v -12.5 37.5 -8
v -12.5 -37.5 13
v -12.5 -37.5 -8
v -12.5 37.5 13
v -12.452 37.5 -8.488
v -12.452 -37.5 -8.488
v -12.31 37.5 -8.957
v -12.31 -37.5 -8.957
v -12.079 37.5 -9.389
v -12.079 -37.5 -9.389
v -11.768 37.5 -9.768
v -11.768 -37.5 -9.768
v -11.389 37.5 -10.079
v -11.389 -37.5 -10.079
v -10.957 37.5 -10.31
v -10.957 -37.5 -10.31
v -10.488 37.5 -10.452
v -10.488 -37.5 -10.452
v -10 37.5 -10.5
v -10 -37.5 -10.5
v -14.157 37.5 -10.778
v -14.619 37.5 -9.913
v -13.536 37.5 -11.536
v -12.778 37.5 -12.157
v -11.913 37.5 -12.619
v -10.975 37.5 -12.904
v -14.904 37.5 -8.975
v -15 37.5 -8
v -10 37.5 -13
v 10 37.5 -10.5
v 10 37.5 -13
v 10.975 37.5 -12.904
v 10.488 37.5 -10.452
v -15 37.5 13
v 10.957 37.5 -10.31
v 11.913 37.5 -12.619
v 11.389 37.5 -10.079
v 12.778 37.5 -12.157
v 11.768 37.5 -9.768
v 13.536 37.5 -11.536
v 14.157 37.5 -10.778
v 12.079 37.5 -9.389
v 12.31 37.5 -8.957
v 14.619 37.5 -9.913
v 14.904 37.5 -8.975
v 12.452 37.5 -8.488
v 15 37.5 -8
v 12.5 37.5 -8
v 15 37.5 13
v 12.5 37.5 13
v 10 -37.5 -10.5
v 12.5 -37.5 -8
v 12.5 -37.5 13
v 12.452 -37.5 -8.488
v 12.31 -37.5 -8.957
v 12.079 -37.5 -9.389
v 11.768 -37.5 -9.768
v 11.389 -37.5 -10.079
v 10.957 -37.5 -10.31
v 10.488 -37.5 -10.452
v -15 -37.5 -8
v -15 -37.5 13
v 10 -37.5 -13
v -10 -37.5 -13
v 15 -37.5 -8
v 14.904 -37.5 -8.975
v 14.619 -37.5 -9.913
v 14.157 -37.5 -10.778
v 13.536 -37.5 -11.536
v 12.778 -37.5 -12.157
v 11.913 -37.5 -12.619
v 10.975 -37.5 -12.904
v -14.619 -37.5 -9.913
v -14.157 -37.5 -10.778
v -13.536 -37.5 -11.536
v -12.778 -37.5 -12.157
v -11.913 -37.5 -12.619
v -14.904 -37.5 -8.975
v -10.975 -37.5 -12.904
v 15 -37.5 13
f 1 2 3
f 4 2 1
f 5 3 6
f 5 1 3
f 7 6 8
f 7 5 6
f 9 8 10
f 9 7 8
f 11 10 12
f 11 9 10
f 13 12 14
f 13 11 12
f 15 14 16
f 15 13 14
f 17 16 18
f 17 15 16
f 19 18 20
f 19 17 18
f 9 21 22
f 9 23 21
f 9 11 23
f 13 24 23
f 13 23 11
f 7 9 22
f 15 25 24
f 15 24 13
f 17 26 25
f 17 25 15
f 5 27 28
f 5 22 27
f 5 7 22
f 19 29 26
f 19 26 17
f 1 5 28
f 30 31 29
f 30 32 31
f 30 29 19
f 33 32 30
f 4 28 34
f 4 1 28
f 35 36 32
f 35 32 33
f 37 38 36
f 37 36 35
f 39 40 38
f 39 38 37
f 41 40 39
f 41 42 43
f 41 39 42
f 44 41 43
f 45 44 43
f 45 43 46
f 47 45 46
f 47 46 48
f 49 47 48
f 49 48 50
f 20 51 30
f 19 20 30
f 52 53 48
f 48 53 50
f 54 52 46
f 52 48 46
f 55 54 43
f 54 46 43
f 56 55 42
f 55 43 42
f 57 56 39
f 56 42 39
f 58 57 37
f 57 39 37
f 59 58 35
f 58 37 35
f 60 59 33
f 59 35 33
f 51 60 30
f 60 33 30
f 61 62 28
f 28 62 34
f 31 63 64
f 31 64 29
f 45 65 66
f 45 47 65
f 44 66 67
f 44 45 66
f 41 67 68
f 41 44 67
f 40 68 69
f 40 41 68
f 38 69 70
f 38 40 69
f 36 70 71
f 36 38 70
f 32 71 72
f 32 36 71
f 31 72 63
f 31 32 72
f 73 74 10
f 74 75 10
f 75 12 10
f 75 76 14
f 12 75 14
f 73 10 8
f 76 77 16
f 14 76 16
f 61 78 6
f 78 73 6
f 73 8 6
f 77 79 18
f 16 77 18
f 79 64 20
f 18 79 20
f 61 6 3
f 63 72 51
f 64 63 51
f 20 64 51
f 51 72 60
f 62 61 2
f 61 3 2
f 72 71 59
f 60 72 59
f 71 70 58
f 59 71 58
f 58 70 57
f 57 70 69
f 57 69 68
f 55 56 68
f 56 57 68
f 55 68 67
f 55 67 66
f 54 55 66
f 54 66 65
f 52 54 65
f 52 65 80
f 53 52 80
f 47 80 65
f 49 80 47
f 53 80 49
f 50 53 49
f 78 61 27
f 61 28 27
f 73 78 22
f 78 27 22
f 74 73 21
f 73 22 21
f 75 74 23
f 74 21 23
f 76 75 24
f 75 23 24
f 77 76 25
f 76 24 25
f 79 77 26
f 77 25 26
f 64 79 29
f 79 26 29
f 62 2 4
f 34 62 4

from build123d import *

# Parameters (mm, degrees)
F0_W     = 75
F0_H     = 26
F1_DEPTH = 15
F2_R     = 5
F3_T     = -2.5


with BuildPart() as f1:
    # F0 (on Right) → F1 (new body, symmetric)
    with BuildSketch(Plane.YZ):
        Rectangle(F0_W, F0_H)
    extrude(amount=F1_DEPTH, both=True)

    # F2
    f2_edges = [f1.edges().sort_by_distance(p)[0] for p in [
        (15, 0, -13),
        (-15, 0, -13),
    ]]
    fillet(f2_edges, radius=F2_R)

    # F3
    f3_openings = [f1.faces().sort_by_distance(p)[0] for p in [
        (0, 0, 13),
        (0, -37.5, 0.165751),
        (0, 37.5, 0.165751),
    ]]
    offset(amount=F3_T, openings=f3_openings)


solid = f1.part
